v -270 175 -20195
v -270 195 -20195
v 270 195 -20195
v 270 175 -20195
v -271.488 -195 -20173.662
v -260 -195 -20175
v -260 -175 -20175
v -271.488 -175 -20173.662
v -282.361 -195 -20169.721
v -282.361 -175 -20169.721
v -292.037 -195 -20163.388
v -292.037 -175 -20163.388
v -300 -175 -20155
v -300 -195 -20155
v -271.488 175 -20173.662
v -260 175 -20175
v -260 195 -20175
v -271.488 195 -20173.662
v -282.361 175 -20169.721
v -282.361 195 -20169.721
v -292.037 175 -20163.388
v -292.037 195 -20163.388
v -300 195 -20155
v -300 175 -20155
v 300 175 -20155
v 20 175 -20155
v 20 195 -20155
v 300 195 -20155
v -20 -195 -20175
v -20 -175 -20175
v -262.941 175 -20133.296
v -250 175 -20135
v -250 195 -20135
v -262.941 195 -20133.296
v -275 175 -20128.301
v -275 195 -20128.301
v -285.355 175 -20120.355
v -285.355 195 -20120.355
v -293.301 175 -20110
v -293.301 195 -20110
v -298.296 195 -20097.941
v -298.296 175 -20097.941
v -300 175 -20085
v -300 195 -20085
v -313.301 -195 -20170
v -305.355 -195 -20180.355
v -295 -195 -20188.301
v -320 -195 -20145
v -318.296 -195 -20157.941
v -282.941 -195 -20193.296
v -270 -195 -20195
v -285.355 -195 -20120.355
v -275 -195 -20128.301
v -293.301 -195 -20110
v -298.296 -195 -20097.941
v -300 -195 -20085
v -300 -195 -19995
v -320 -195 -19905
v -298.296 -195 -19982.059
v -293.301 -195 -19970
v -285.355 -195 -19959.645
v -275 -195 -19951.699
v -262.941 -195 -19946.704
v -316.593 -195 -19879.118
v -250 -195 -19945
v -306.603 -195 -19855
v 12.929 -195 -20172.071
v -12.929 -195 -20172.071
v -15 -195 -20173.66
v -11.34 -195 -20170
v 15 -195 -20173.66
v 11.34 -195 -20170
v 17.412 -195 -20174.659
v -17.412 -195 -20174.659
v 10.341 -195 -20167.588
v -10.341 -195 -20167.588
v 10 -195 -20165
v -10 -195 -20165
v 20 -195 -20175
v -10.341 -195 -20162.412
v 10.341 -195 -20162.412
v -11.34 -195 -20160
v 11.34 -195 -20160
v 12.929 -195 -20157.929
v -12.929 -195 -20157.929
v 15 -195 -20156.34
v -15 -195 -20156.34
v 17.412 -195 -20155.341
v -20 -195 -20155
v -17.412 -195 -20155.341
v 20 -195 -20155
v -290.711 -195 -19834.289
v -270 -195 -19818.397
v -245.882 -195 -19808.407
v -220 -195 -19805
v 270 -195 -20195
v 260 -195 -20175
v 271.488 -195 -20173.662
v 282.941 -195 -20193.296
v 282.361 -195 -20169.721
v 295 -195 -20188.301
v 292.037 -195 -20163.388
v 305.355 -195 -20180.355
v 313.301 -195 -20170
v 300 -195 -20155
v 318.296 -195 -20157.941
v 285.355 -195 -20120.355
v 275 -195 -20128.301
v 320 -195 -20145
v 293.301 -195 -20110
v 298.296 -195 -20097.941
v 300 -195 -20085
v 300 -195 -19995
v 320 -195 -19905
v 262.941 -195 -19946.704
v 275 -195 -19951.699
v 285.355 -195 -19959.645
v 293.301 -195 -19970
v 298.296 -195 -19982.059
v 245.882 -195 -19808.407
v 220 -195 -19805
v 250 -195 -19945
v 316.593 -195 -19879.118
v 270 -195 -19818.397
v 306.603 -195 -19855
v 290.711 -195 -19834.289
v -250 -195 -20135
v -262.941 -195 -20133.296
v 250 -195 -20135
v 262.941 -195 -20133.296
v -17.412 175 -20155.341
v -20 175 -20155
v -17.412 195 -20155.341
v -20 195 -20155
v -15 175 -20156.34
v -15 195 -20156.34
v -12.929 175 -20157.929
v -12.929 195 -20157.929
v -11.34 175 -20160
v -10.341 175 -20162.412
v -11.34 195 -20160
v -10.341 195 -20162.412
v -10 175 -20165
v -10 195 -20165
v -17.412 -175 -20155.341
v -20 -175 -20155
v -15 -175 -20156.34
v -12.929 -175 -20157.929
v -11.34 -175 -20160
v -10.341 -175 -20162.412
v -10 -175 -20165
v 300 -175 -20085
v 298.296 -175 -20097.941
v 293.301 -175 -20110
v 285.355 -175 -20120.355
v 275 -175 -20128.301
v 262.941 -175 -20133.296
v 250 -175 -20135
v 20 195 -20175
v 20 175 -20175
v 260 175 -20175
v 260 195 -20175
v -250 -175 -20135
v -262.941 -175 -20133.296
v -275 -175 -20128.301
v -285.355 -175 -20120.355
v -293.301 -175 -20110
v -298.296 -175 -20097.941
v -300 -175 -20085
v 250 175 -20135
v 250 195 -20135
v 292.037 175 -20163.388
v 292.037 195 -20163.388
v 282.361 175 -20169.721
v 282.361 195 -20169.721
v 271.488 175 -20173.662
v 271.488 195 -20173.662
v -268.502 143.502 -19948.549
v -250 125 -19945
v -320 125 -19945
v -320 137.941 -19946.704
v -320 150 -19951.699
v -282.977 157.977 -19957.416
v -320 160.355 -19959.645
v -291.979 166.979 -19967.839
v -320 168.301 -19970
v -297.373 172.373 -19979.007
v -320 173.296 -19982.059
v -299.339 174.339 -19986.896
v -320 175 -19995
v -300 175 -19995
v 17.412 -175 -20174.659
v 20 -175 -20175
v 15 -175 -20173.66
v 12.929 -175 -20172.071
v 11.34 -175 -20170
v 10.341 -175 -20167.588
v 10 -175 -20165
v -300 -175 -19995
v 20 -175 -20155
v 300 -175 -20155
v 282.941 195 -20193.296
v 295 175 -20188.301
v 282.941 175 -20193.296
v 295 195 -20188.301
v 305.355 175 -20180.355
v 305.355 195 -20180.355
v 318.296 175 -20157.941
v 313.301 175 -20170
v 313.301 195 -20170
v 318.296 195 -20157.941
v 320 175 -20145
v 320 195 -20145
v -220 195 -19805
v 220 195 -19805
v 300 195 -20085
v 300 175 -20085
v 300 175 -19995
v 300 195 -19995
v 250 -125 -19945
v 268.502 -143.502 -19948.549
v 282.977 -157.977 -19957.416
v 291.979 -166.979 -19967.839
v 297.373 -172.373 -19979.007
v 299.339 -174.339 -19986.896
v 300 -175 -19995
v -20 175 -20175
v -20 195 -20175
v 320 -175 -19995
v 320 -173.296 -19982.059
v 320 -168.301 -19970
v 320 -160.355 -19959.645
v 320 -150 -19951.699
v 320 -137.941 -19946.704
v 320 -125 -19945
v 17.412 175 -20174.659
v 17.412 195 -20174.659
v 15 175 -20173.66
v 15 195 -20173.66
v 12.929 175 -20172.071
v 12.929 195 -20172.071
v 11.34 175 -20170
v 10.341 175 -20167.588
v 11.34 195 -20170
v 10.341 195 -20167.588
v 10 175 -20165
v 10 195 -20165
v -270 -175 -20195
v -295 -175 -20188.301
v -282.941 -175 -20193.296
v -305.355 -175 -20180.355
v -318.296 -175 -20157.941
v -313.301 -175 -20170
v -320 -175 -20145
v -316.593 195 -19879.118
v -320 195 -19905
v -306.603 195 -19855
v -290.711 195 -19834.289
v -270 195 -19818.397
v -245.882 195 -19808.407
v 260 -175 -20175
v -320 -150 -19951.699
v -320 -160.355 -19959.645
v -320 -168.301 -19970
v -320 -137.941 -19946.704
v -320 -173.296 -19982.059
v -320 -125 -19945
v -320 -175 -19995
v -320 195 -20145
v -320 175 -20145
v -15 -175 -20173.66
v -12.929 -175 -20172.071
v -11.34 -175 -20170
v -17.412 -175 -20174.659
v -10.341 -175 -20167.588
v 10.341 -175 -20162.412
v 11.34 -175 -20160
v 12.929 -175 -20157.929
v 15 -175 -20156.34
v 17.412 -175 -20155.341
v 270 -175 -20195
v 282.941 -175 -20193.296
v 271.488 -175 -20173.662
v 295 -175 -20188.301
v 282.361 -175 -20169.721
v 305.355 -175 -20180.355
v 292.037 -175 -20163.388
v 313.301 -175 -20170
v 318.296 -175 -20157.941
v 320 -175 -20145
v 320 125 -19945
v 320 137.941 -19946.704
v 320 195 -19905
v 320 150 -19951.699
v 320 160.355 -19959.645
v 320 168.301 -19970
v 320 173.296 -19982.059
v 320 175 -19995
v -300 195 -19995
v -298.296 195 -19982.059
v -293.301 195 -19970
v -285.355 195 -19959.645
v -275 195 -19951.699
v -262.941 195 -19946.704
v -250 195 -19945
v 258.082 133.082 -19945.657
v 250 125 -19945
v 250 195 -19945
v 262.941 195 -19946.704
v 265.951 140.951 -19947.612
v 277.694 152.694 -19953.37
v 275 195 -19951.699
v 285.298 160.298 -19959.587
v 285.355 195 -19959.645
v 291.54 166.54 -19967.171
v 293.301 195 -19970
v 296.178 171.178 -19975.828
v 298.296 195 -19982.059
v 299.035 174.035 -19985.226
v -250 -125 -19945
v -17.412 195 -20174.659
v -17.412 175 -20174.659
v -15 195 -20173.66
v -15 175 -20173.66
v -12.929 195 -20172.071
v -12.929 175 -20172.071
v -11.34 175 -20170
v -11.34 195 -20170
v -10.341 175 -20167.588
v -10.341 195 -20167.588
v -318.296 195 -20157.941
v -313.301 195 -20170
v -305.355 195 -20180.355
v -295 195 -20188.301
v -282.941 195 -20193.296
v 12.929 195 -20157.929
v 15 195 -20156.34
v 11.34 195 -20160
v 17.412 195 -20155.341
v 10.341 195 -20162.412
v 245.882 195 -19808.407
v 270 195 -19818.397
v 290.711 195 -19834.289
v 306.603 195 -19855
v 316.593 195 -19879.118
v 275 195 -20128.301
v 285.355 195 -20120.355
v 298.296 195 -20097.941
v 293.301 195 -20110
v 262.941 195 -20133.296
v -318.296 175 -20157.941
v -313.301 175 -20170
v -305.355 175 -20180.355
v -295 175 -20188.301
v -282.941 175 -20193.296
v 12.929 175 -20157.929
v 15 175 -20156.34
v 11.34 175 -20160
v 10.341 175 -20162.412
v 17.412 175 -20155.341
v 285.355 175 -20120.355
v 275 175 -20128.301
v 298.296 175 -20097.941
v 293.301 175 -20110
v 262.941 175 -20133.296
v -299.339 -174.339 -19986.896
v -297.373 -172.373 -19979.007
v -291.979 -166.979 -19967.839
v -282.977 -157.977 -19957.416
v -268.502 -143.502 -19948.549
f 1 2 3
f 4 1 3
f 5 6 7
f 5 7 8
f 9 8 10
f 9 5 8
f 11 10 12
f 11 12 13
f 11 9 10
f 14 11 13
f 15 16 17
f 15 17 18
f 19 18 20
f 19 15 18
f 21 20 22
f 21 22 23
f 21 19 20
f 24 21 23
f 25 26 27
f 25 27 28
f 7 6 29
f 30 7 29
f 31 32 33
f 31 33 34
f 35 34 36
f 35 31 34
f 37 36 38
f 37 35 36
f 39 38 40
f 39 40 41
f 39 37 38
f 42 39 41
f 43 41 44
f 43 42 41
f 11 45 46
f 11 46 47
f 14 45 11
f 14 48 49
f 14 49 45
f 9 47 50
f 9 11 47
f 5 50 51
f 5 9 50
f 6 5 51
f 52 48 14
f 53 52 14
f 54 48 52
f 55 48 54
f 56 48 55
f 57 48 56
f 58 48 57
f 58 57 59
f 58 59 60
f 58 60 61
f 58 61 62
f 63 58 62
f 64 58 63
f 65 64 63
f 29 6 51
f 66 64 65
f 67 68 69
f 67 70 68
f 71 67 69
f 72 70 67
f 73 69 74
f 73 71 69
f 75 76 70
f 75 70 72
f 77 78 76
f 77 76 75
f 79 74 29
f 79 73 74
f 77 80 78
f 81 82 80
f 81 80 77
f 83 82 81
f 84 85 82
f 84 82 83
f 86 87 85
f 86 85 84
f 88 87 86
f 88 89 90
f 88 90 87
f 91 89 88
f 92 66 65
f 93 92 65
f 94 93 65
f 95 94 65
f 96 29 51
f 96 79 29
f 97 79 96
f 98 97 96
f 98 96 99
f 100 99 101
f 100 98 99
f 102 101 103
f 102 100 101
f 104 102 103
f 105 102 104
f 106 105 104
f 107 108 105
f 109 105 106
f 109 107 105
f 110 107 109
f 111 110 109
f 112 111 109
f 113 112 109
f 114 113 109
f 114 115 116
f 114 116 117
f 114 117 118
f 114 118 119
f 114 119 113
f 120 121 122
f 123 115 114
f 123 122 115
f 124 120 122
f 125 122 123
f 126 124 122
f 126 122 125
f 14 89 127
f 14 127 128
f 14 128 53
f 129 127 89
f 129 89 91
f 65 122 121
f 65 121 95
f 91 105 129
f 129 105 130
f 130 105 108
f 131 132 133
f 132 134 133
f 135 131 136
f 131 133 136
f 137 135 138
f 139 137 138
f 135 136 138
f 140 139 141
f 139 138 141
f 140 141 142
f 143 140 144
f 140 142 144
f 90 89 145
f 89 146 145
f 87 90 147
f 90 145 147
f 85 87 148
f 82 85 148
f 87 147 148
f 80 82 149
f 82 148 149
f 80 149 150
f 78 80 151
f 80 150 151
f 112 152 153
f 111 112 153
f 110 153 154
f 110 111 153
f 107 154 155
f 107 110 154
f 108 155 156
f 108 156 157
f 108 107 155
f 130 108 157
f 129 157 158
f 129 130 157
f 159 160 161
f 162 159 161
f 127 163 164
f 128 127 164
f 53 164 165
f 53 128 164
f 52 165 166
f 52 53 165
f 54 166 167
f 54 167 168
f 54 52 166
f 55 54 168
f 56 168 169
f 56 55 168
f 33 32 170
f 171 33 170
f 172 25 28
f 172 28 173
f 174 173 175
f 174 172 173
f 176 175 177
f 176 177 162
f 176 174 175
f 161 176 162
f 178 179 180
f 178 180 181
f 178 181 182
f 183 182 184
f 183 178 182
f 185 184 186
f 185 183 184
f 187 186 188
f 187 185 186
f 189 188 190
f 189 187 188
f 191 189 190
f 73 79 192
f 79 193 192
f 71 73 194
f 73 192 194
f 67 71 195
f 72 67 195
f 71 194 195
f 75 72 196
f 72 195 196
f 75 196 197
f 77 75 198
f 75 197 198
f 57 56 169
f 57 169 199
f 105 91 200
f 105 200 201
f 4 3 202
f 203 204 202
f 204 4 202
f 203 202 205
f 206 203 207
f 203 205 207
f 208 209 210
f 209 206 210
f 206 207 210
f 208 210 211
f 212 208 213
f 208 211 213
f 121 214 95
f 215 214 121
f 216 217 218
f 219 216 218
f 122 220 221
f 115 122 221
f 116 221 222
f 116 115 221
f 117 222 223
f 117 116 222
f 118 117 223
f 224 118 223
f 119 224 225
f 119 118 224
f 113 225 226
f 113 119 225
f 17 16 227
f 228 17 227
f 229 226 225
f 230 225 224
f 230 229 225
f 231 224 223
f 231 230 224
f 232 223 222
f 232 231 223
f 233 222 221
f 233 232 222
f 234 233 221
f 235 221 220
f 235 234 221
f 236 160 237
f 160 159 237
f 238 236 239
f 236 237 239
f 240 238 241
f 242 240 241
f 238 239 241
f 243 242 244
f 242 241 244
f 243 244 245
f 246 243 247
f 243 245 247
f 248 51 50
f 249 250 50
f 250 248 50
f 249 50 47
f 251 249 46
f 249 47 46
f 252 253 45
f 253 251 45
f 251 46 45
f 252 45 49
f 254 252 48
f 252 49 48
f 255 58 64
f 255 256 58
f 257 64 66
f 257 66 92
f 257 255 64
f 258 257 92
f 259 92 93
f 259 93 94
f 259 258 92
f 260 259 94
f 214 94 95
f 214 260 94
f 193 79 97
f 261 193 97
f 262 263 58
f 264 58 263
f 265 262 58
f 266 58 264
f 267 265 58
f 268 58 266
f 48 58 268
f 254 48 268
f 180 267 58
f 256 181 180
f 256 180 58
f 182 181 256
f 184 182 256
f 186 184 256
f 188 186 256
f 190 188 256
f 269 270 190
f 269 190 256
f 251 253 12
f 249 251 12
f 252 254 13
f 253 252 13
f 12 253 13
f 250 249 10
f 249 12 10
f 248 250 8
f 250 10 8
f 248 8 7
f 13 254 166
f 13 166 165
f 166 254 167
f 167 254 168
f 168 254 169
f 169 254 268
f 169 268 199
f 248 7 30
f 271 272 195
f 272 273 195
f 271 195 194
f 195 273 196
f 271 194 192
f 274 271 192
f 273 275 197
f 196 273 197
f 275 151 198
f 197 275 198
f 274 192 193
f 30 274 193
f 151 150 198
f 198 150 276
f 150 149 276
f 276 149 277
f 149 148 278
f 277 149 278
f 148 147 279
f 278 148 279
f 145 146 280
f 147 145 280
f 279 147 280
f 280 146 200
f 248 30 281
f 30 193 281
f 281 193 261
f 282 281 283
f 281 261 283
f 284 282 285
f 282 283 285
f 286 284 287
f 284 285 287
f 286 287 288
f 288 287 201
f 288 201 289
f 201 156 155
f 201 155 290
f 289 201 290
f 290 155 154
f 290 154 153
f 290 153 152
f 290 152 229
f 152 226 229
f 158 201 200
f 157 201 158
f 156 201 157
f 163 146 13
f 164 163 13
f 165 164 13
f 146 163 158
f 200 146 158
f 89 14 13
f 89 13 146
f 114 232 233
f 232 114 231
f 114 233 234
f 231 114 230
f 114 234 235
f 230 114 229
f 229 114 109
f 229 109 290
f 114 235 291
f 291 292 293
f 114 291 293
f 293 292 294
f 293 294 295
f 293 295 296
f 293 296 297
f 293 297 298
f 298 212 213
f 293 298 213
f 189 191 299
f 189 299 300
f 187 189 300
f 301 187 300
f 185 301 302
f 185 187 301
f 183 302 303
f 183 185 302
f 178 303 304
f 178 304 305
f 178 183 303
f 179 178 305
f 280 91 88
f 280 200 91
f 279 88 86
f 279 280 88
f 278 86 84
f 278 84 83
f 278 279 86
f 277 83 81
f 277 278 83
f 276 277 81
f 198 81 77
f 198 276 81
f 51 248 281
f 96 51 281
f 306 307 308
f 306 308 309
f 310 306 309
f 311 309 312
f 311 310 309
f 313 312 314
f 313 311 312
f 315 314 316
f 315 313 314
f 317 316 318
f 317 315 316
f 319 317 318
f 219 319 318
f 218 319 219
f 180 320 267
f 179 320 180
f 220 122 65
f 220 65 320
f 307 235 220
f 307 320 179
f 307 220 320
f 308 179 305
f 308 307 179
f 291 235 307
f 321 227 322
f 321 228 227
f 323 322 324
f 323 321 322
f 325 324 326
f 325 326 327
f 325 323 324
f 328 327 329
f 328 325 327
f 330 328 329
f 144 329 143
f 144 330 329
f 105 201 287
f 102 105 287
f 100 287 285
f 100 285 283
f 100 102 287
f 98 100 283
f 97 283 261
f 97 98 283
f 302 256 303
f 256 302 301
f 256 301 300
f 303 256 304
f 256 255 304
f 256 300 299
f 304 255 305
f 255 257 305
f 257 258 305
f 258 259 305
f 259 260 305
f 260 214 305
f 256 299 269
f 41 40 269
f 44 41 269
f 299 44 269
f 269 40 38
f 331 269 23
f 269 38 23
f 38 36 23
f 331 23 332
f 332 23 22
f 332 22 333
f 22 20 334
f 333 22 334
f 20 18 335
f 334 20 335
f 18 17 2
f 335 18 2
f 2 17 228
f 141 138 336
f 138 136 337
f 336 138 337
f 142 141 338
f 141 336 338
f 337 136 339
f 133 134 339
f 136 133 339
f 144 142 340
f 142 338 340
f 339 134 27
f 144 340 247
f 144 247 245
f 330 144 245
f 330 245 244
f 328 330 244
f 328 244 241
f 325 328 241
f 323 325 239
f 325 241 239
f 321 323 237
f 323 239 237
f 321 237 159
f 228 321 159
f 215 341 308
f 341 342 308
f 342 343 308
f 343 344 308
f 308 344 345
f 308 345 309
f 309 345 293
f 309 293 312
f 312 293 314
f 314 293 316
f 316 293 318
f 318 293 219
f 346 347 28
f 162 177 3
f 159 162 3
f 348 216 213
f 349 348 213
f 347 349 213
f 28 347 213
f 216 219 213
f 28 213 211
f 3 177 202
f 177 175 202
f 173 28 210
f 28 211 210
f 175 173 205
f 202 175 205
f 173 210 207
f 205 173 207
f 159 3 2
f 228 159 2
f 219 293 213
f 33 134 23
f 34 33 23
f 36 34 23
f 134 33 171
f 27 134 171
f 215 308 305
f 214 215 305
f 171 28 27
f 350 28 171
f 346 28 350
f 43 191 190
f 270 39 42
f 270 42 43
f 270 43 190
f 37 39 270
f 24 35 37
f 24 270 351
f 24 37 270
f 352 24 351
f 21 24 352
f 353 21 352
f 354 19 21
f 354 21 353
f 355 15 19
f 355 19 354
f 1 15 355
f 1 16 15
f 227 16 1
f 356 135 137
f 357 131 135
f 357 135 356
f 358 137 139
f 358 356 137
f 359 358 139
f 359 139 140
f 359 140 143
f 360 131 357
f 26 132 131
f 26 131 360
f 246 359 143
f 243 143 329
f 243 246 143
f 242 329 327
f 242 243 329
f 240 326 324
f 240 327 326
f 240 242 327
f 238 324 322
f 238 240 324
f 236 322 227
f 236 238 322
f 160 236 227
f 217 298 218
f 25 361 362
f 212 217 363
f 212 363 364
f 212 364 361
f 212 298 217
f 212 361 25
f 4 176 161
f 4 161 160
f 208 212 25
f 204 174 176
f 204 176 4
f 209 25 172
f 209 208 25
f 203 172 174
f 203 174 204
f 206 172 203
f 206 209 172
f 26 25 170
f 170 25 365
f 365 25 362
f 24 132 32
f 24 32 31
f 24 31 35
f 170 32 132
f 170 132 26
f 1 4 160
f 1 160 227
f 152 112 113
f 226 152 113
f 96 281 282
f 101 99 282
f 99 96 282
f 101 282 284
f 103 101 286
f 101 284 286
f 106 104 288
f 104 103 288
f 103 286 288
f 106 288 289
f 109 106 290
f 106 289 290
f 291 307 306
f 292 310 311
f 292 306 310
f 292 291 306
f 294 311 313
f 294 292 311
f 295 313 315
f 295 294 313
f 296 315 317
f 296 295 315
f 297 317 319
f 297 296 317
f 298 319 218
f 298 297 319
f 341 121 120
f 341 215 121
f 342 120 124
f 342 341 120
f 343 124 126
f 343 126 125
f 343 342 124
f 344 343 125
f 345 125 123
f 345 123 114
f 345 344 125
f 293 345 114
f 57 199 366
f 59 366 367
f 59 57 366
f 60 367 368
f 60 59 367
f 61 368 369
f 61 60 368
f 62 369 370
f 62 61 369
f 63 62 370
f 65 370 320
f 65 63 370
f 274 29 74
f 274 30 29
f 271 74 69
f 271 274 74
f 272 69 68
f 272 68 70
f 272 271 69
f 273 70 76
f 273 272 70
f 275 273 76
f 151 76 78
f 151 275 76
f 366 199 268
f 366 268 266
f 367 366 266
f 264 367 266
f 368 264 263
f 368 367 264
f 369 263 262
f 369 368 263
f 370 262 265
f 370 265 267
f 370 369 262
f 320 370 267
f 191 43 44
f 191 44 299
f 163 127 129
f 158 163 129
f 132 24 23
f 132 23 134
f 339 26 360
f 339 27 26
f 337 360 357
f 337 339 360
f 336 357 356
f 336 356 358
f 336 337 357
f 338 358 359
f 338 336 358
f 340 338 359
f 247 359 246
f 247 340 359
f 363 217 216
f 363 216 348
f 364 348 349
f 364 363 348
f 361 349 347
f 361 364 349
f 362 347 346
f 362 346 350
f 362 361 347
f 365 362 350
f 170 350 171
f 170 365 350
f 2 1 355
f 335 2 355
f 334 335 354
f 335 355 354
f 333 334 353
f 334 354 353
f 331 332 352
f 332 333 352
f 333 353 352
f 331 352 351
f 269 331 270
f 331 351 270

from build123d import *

# Parameters (mm, degrees)
BOSS_EXTRUDE1_DEPTH      = 195
BOSS_EXTRUDE1_DEPTH_BACK = 195
BOSS_EXTRUDE1_START      = -20000
SKETCH1_W                = 640
SKETCH1_H                = 390
SKETCH2_W                = 300
SKETCH2_H                = 350
CUT_EXTRUDE1_DEPTH       = 20207.079530676
SKETCH3_W                = 290
SKETCH3_H                = 20
SKETCH3_W_2              = 600
SKETCH3_H_2              = 190
CUT_EXTRUDE2_DEPTH       = 20202.300081925
FILLET1_R                = 50
FILLET2_R                = 10
FILLET4_R                = 100


# Some blends are built 0.0001 mm under size
with BuildPart() as part:
    # Sketch1 → Boss-Extrude1 (new, two sides: drawn at the far end of the back side and taken through both)
    with BuildSketch(Plane.XY.offset(BOSS_EXTRUDE1_START - BOSS_EXTRUDE1_DEPTH_BACK)):
        Rectangle(SKETCH1_W, SKETCH1_H)
    extrude(amount=BOSS_EXTRUDE1_DEPTH + BOSS_EXTRUDE1_DEPTH_BACK)

    # Sketch2 → Cut-Extrude1 (cut, through all)
    with BuildSketch(Plane(origin=(320, 0, 0), x_dir=(0, 0, -1), z_dir=(1, 0, 0))):
        with Locations((20095, 0)):
            Rectangle(SKETCH2_W, SKETCH2_H)
    extrude(amount=-CUT_EXTRUDE1_DEPTH, mode=Mode.SUBTRACT)

    # Sketch3 → Cut-Extrude2 (cut, through all)
    with BuildSketch(Plane.XZ.offset(195)):
        with Locations((-155, -20165)):
            Rectangle(SKETCH3_W, SKETCH3_H)
        with Locations((155, -20165)):
            Rectangle(SKETCH3_W, SKETCH3_H)
        with Locations((0, -20040)):
            Rectangle(SKETCH3_W_2, SKETCH3_H_2)
    extrude(amount=-CUT_EXTRUDE2_DEPTH, mode=Mode.SUBTRACT)

    # Fillet1
    # the kernel refuses this fillet: 50 mm, written as the material it adds along each edge
    with BuildSketch(Plane(origin=(300, -195, -20135), x_dir=(-1, 0, 0), z_dir=(0, 1, 0)), Plane(origin=(-300, -195, -20135), x_dir=(0, 0, 1), z_dir=(0, 1, 0)), Plane(origin=(300, 175, -19945), x_dir=(0, 0, -1), z_dir=(0, 1, 0)), Plane(origin=(-300, -175, -19945), x_dir=(0, 1, 0), z_dir=(-1, 0, 0)), Plane(origin=(320, -175, -19945), x_dir=(0, 1, 0), z_dir=(-1, 0, 0)), Plane(origin=(-300, -195, -19945), x_dir=(1, 0, 0), z_dir=(0, 1, 0))) as fillet1_piece_1:
        with BuildLine():
            CenterArc((FILLET1_R, FILLET1_R), FILLET1_R, 180, 90)
            Line((0, FILLET1_R), (0, 0))
            Line((0, 0), (FILLET1_R, 0))
        make_face()
    extrude(amount=20)
    with BuildSketch(Plane(origin=(300, 175, -20135), x_dir=(0, 0, 1), z_dir=(0, 1, 0)), Plane(origin=(-300, 175, -20135), x_dir=(1, 0, 0), z_dir=(0, 1, 0)), Plane(origin=(300, -195, -19945), x_dir=(-1, 0, 0), z_dir=(0, 1, 0)), Plane(origin=(-300, 175, -19945), x_dir=(0, -1, 0), z_dir=(-1, 0, 0)), Plane(origin=(320, 175, -19945), x_dir=(0, -1, 0), z_dir=(-1, 0, 0)), Plane(origin=(-300, 175, -19945), x_dir=(0, 0, -1), z_dir=(0, 1, 0))) as fillet1_piece_2:
        with BuildLine():
            CenterArc((FILLET1_R, -FILLET1_R), FILLET1_R, 90, 90)
            Line((0, -FILLET1_R), (0, 0))
            Line((0, 0), (FILLET1_R, 0))
        make_face()
    extrude(amount=20)
    with BuildSketch(Plane(origin=(-300, -195, -20175), x_dir=(0, 0, 1), z_dir=(0, 1, 0))) as fillet1_piece_3:
        with BuildLine():
            CenterArc((50, 40), FILLET1_R, 180, 53.130102354)
            Line((0, 40), (0, 0))
            Line((0, 0), (20, 0))
        make_face()
    extrude(amount=20)
    with BuildSketch(Plane(origin=(-300, 175, -20175), x_dir=(1, 0, 0), z_dir=(0, 1, 0))) as fillet1_piece_4:
        with BuildLine():
            CenterArc((40, -50), FILLET1_R, 90, 53.130102354)
            Line((0, -20), (0, 0))
            Line((0, 0), (40, 0))
        make_face()
    extrude(amount=20)
    with BuildSketch(Plane(origin=(300, -195, -20175), x_dir=(-1, 0, 0), z_dir=(0, 1, 0))) as fillet1_piece_5:
        with BuildLine():
            CenterArc((40, 50), FILLET1_R, 216.869897646, 53.130102354)
            Line((0, 20), (0, 0))
            Line((0, 0), (40, 0))
        make_face()
    extrude(amount=20)
    with BuildSketch(Plane(origin=(300, 175, -20175), x_dir=(0, 0, 1), z_dir=(0, 1, 0))) as fillet1_piece_6:
        with BuildLine():
            CenterArc((50, -40), FILLET1_R, 126.869897646, 53.130102354)
            Line((0, -40), (0, 0))
            Line((0, 0), (20, 0))
        make_face()
    extrude(amount=20)
    with BuildSketch(Plane(origin=(320, -175, -19945), x_dir=(0, 1, 0), z_dir=(-1, 0, 0))) as fillet1_piece_7a_section:
        with BuildLine():
            CenterArc((FILLET1_R, FILLET1_R), FILLET1_R, 180, 90)
            Line((0, FILLET1_R), (0, 0))
            Line((0, 0), (FILLET1_R, 0))
        make_face()
    fillet1_piece_7a = extrude(amount=145, mode=Mode.PRIVATE)
    fillet1_piece_7a = split(fillet1_piece_7a, bisect_by=Plane(origin=(300, -175, -19945), z_dir=(-1, 0, 0)), keep=Keep.TOP, mode=Mode.PRIVATE)
    with BuildSketch(Plane(origin=(300, -195, -19945), x_dir=(-1, 0, 0), z_dir=(0, 1, 0))) as fillet1_piece_7b_section:
        with BuildLine():
            CenterArc((FILLET1_R, -FILLET1_R), FILLET1_R, 90, 90)
            Line((0, -FILLET1_R), (0, 0))
            Line((0, 0), (FILLET1_R, 0))
        make_face()
    fillet1_piece_7b = extrude(amount=145, mode=Mode.PRIVATE)
    fillet1_piece_7b = split(fillet1_piece_7b, bisect_by=Plane(origin=(300, -175, -19945), z_dir=(0, 1, 0)), keep=Keep.TOP, mode=Mode.PRIVATE)
    fillet1_piece_7 = fillet1_piece_7a & fillet1_piece_7b
    add(fillet1_piece_7)
    with BuildSketch(Plane(origin=(300, 50, -19945), x_dir=(0, 0, -1), z_dir=(0, 1, 0))) as fillet1_piece_8a_section:
        with BuildLine():
            CenterArc((FILLET1_R, FILLET1_R), FILLET1_R, 180, 90)
            Line((0, FILLET1_R), (0, 0))
            Line((0, 0), (FILLET1_R, 0))
        make_face()
    fillet1_piece_8a = extrude(amount=145, mode=Mode.PRIVATE)
    fillet1_piece_8a = split(fillet1_piece_8a, bisect_by=Plane(origin=(300, 175, -19945), z_dir=(0, -1, 0)), keep=Keep.TOP, mode=Mode.PRIVATE)
    with BuildSketch(Plane(origin=(320, 175, -19945), x_dir=(0, -1, 0), z_dir=(-1, 0, 0))) as fillet1_piece_8b_section:
        with BuildLine():
            CenterArc((FILLET1_R, -FILLET1_R), FILLET1_R, 90, 90)
            Line((0, -FILLET1_R), (0, 0))
            Line((0, 0), (FILLET1_R, 0))
        make_face()
    fillet1_piece_8b = extrude(amount=145, mode=Mode.PRIVATE)
    fillet1_piece_8b = split(fillet1_piece_8b, bisect_by=Plane(origin=(300, 175, -19945), z_dir=(-1, 0, 0)), keep=Keep.TOP, mode=Mode.PRIVATE)
    fillet1_piece_8 = fillet1_piece_8a & fillet1_piece_8b
    add(fillet1_piece_8)
    with BuildSketch(Plane(origin=(-300, 50, -19945), x_dir=(0, 0, -1), z_dir=(0, 1, 0))) as fillet1_piece_9a_section:
        with BuildLine():
            CenterArc((FILLET1_R, -FILLET1_R), FILLET1_R, 90, 90)
            Line((0, -FILLET1_R), (0, 0))
            Line((0, 0), (FILLET1_R, 0))
        make_face()
    fillet1_piece_9a = extrude(amount=145, mode=Mode.PRIVATE)
    fillet1_piece_9a = split(fillet1_piece_9a, bisect_by=Plane(origin=(-300, 175, -19945), z_dir=(0, -1, 0)), keep=Keep.TOP, mode=Mode.PRIVATE)
    with BuildSketch(Plane(origin=(-175, 175, -19945), x_dir=(0, -1, 0), z_dir=(-1, 0, 0))) as fillet1_piece_9b_section:
        with BuildLine():
            CenterArc((FILLET1_R, -FILLET1_R), FILLET1_R, 90, 90)
            Line((0, -FILLET1_R), (0, 0))
            Line((0, 0), (FILLET1_R, 0))
        make_face()
    fillet1_piece_9b = extrude(amount=145, mode=Mode.PRIVATE)
    fillet1_piece_9b = split(fillet1_piece_9b, bisect_by=Plane(origin=(-300, 175, -19945), z_dir=(1, 0, 0)), keep=Keep.TOP, mode=Mode.PRIVATE)
    fillet1_piece_9 = fillet1_piece_9a & fillet1_piece_9b
    add(fillet1_piece_9)
    with BuildSketch(Plane(origin=(-300, -195, -19945), x_dir=(1, 0, 0), z_dir=(0, 1, 0))) as fillet1_piece_10a_section:
        with BuildLine():
            CenterArc((FILLET1_R, FILLET1_R), FILLET1_R, 180, 90)
            Line((0, FILLET1_R), (0, 0))
            Line((0, 0), (FILLET1_R, 0))
        make_face()
    fillet1_piece_10a = extrude(amount=145, mode=Mode.PRIVATE)
    fillet1_piece_10a = split(fillet1_piece_10a, bisect_by=Plane(origin=(-300, -175, -19945), z_dir=(0, 1, 0)), keep=Keep.TOP, mode=Mode.PRIVATE)
    with BuildSketch(Plane(origin=(-175, -175, -19945), x_dir=(0, 1, 0), z_dir=(-1, 0, 0))) as fillet1_piece_10b_section:
        with BuildLine():
            CenterArc((FILLET1_R, FILLET1_R), FILLET1_R, 180, 90)
            Line((0, FILLET1_R), (0, 0))
            Line((0, 0), (FILLET1_R, 0))
        make_face()
    fillet1_piece_10b = extrude(amount=145, mode=Mode.PRIVATE)
    fillet1_piece_10b = split(fillet1_piece_10b, bisect_by=Plane(origin=(-300, -175, -19945), z_dir=(1, 0, 0)), keep=Keep.TOP, mode=Mode.PRIVATE)
    fillet1_piece_10 = fillet1_piece_10a & fillet1_piece_10b
    add(fillet1_piece_10)
    # the kernel refuses this fillet: 50 mm, written as the material it takes off along each edge
    with BuildSketch(Plane(origin=(320, -50, -20195), x_dir=(-1, 0, 0), z_dir=(0, -1, 0)), Plane(origin=(-320, -320, -20195), x_dir=(1, 0, 0), z_dir=(0, 1, 0)), Plane(origin=(320, 320, -20195), x_dir=(-1, 0, 0), z_dir=(0, -1, 0))) as fillet1_2_piece_1:
        with BuildLine():
            CenterArc((FILLET1_R, -FILLET1_R), FILLET1_R, 90, 90)
            Line((0, -FILLET1_R), (0, 0))
            Line((0, 0), (FILLET1_R, 0))
        make_face()
    extrude(amount=270, mode=Mode.SUBTRACT)
    with BuildSketch(Plane(origin=(-320, 50, -20195), x_dir=(0, 0, 1), z_dir=(0, 1, 0))) as fillet1_2_piece_2:
        with BuildLine():
            CenterArc((FILLET1_R, FILLET1_R), FILLET1_R, 180, 90)
            Line((0, FILLET1_R), (0, 0))
            Line((0, 0), (FILLET1_R, 0))
        make_face()
    extrude(amount=270, mode=Mode.SUBTRACT)

    # Fillet2
    fillet2_edges = [part.edges().sort_by_distance(p)[0] for p in [
        (-10, -185, -20175),
        (-10, 185, -20175),
        (10, -185, -20175),
        (10, 185, -20175),
        (10, 185, -20155),
        (10, -185, -20155),
        (-10, 185, -20155),
        (-10, -185, -20155),
    ]]
    fillet(fillet2_edges, radius=FILLET2_R - 0.0001)  # a hair under: the kernel refuses the full size

    # Fillet4
    fillet4_edges = [part.edges().sort_by_distance(p)[0] for p in [
        (-320, 0, -19805),
        (320, 0, -19805),
    ]]
    fillet(fillet4_edges, radius=FILLET4_R)


solid = part.part
